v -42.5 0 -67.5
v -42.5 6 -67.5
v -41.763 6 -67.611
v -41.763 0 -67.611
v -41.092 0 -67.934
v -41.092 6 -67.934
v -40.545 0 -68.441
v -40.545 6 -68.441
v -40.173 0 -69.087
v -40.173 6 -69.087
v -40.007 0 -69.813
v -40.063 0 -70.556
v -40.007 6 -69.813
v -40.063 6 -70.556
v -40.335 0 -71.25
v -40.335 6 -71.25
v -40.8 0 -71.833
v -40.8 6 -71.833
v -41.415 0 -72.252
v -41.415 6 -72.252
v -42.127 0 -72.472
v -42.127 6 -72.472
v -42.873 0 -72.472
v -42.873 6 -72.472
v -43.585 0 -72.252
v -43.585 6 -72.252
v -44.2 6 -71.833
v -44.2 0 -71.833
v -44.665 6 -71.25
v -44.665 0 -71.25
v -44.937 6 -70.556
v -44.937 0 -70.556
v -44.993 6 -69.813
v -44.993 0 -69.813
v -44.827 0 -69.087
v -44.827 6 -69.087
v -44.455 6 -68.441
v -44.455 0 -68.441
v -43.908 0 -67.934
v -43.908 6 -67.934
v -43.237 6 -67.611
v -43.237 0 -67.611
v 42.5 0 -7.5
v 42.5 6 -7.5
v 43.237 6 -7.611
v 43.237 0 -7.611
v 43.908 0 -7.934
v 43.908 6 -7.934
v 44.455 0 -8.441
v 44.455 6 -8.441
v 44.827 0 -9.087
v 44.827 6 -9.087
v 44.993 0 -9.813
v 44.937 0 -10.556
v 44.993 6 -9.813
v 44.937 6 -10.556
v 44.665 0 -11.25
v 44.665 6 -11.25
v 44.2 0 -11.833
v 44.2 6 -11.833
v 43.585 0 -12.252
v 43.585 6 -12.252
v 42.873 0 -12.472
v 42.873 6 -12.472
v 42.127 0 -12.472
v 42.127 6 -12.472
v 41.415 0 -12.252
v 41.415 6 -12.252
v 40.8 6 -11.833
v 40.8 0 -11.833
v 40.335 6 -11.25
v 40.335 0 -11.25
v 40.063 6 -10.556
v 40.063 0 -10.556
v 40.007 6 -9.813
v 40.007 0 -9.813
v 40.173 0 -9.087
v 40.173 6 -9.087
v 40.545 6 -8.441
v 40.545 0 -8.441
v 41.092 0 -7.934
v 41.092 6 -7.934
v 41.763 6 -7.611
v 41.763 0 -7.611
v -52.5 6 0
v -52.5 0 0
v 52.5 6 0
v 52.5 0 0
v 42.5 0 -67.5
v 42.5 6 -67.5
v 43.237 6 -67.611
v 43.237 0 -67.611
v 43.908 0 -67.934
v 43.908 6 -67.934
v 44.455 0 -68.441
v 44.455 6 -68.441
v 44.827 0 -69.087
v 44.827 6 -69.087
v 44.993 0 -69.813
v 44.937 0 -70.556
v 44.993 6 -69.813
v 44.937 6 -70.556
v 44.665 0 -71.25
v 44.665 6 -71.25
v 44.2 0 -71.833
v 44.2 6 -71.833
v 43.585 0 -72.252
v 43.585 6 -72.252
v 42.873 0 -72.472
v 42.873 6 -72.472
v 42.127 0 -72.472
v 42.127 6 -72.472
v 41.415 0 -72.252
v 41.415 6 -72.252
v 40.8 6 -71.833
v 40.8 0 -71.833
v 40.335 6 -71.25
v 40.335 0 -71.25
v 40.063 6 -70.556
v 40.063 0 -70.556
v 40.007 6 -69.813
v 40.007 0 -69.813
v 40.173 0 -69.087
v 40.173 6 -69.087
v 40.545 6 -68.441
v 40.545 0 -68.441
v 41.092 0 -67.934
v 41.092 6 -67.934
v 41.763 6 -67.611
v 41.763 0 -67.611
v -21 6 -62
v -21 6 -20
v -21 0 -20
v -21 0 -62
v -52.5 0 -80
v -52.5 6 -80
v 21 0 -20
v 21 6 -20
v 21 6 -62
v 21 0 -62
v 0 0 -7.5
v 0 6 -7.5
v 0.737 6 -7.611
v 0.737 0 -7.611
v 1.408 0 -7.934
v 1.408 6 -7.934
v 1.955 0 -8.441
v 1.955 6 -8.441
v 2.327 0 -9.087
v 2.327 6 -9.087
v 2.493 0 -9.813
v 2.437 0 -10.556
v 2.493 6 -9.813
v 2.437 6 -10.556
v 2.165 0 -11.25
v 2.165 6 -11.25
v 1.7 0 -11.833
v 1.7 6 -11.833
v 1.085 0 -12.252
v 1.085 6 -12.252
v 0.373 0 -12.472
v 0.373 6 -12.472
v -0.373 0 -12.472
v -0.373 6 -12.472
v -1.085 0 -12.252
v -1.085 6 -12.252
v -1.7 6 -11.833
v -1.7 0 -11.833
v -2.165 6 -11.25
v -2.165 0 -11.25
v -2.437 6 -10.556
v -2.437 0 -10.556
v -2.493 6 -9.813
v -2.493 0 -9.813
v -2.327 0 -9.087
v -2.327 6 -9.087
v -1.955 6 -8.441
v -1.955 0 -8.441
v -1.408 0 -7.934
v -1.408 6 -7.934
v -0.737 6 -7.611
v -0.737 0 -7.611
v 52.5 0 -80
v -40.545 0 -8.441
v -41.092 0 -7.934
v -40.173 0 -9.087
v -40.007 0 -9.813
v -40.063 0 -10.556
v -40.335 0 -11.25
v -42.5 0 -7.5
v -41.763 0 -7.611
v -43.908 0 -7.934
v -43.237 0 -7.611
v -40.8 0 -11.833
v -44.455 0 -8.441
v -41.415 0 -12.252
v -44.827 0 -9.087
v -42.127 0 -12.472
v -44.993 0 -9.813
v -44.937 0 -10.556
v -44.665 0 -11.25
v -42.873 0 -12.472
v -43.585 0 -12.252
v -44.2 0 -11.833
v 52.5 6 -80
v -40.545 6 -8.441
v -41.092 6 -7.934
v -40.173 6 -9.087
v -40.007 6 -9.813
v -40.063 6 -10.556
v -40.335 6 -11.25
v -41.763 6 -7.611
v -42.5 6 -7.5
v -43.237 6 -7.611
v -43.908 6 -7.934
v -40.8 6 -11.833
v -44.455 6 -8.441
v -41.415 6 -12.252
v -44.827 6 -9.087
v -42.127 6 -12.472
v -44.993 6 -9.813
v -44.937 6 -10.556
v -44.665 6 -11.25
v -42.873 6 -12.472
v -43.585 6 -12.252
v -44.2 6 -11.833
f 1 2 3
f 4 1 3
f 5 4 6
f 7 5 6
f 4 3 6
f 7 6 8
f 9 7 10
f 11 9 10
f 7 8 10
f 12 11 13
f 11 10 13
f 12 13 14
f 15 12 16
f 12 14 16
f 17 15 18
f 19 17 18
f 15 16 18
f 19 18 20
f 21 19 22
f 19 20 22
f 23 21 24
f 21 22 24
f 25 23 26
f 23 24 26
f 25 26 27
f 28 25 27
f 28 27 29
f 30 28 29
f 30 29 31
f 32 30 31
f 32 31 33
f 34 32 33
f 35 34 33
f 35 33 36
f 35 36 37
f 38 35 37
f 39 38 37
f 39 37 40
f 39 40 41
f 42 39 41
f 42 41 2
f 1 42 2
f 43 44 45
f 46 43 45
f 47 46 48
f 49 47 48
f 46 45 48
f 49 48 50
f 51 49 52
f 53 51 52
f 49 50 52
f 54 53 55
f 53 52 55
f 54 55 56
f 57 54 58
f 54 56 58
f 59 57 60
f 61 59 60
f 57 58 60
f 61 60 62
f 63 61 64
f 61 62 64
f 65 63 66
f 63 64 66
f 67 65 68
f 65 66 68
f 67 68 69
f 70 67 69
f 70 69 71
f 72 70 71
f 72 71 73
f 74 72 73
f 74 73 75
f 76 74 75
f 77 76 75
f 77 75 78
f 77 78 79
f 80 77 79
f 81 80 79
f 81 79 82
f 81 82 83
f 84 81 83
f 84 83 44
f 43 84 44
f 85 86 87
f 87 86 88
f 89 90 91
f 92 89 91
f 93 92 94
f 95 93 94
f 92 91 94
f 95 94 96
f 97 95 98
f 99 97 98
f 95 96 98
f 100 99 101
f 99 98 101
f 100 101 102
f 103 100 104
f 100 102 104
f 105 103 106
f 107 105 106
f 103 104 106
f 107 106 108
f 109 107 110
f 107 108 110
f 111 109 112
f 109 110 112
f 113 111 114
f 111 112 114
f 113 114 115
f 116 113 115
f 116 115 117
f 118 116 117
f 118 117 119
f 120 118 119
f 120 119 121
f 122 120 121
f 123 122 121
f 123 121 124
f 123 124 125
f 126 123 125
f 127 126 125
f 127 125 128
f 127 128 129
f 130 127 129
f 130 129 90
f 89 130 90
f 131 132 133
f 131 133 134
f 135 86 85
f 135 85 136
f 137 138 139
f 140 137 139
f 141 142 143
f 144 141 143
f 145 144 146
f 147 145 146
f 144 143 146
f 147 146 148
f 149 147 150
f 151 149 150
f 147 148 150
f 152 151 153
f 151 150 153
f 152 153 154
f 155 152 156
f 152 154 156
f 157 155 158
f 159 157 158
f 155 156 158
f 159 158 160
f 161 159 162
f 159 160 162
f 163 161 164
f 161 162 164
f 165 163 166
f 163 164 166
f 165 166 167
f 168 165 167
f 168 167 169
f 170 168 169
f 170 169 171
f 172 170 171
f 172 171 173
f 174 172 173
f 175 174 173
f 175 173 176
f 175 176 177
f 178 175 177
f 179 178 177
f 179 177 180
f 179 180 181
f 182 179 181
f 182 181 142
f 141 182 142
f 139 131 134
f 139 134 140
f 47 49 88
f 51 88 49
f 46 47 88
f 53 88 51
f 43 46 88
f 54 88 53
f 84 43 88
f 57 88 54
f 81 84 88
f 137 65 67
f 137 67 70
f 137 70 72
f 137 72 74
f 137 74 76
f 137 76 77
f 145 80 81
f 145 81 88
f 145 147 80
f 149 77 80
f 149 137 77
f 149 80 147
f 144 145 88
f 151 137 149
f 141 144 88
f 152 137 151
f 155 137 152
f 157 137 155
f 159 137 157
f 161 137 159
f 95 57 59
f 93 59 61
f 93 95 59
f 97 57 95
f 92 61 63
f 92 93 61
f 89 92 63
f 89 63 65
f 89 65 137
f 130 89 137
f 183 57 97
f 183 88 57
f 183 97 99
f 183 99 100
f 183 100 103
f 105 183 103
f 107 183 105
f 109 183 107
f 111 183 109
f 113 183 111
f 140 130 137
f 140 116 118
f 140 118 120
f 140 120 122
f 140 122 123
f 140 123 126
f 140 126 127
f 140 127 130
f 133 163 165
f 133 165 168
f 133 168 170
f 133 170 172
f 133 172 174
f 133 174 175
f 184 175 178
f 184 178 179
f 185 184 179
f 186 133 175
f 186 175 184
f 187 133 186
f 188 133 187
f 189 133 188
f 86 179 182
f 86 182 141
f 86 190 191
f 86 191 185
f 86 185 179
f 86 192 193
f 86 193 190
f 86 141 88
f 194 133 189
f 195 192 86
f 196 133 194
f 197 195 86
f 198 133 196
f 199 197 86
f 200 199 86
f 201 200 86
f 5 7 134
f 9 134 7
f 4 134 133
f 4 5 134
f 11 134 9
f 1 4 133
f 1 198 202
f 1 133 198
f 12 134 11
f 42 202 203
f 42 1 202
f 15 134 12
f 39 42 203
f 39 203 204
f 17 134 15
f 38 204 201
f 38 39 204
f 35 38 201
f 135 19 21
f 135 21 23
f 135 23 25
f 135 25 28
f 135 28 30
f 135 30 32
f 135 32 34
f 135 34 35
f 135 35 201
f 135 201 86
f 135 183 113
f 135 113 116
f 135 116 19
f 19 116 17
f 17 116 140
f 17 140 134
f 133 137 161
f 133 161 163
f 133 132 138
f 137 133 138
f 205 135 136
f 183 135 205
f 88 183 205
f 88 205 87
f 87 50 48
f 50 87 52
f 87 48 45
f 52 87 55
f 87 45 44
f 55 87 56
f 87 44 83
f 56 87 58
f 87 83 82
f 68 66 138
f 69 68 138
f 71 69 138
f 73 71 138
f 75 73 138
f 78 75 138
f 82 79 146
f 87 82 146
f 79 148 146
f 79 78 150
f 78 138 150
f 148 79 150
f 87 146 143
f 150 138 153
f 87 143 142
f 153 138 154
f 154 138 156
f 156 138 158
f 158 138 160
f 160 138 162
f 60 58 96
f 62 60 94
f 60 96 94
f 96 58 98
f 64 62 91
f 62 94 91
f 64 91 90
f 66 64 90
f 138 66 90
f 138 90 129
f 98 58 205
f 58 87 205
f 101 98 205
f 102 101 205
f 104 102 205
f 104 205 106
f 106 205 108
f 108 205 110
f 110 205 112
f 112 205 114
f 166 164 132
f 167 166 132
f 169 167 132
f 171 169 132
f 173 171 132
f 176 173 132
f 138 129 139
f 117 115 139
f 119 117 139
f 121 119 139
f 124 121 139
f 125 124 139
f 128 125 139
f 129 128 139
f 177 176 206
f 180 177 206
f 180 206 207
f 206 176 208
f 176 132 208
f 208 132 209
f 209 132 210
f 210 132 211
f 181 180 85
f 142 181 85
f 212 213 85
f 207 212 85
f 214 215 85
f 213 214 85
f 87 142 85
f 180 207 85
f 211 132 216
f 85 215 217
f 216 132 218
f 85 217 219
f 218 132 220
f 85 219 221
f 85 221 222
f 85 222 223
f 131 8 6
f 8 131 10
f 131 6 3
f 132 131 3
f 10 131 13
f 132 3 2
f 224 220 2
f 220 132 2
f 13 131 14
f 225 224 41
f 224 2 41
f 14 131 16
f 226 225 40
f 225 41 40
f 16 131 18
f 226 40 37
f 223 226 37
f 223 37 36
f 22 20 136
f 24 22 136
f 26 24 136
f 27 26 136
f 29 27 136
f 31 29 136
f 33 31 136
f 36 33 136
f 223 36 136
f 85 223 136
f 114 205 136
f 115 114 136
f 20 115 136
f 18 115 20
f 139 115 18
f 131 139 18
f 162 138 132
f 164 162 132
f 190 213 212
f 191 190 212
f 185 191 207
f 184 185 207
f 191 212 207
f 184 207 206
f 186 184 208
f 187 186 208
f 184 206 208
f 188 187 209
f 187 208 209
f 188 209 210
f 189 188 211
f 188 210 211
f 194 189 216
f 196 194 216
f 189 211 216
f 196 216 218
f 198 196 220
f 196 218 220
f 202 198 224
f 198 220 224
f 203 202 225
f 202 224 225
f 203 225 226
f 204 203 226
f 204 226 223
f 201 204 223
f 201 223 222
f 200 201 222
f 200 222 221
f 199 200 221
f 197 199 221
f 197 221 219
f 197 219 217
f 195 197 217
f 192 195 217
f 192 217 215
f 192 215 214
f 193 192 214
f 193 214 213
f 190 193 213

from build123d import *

# Parameters (mm, degrees)
BOSS_EXTRUDE1_DEPTH = 6
SKETCH2_R           = 2.5
SKETCH2_W           = 42
SKETCH2_H           = 42
CUT_EXTRUDE1_DEPTH  = 96.876222287


with BuildPart() as part:
    # Sketch1 → Boss-Extrude1 (new body)
    with BuildSketch(Plane(origin=(0, 0, 0), x_dir=(1, 0, 0), z_dir=(0, 1, 0))):
        Polygon((0, 0), (-52.5, 0), (-52.5, 80), (52.5, 80), (52.5, 0), align=None)
    extrude(amount=BOSS_EXTRUDE1_DEPTH)

    # Sketch2 → Cut-Extrude1 (cut, through all)
    with BuildSketch(Plane(origin=(0, 6, 0), x_dir=(1, 0, 0), z_dir=(0, 1, 0))):
        with Locations(Location((-42.5, 70, 0), (0, 0, 270))):
            Circle(SKETCH2_R)
        with Locations(Location((42.5, 70, 0), (0, 0, 270))):
            Circle(SKETCH2_R)
        with Locations(Location((42.5, 10, 0), (0, 0, 270))):
            Circle(SKETCH2_R)
        with Locations(Location((0, 10, 0), (0, 0, 270))):
            Circle(SKETCH2_R)
        with Locations(Location((-42.5, 10, 0), (0, 0, 270))):
            Circle(SKETCH2_R)
        with Locations((0, 41)):
            Rectangle(SKETCH2_W, SKETCH2_H)
    extrude(amount=-CUT_EXTRUDE1_DEPTH, mode=Mode.SUBTRACT)


solid = part.part
